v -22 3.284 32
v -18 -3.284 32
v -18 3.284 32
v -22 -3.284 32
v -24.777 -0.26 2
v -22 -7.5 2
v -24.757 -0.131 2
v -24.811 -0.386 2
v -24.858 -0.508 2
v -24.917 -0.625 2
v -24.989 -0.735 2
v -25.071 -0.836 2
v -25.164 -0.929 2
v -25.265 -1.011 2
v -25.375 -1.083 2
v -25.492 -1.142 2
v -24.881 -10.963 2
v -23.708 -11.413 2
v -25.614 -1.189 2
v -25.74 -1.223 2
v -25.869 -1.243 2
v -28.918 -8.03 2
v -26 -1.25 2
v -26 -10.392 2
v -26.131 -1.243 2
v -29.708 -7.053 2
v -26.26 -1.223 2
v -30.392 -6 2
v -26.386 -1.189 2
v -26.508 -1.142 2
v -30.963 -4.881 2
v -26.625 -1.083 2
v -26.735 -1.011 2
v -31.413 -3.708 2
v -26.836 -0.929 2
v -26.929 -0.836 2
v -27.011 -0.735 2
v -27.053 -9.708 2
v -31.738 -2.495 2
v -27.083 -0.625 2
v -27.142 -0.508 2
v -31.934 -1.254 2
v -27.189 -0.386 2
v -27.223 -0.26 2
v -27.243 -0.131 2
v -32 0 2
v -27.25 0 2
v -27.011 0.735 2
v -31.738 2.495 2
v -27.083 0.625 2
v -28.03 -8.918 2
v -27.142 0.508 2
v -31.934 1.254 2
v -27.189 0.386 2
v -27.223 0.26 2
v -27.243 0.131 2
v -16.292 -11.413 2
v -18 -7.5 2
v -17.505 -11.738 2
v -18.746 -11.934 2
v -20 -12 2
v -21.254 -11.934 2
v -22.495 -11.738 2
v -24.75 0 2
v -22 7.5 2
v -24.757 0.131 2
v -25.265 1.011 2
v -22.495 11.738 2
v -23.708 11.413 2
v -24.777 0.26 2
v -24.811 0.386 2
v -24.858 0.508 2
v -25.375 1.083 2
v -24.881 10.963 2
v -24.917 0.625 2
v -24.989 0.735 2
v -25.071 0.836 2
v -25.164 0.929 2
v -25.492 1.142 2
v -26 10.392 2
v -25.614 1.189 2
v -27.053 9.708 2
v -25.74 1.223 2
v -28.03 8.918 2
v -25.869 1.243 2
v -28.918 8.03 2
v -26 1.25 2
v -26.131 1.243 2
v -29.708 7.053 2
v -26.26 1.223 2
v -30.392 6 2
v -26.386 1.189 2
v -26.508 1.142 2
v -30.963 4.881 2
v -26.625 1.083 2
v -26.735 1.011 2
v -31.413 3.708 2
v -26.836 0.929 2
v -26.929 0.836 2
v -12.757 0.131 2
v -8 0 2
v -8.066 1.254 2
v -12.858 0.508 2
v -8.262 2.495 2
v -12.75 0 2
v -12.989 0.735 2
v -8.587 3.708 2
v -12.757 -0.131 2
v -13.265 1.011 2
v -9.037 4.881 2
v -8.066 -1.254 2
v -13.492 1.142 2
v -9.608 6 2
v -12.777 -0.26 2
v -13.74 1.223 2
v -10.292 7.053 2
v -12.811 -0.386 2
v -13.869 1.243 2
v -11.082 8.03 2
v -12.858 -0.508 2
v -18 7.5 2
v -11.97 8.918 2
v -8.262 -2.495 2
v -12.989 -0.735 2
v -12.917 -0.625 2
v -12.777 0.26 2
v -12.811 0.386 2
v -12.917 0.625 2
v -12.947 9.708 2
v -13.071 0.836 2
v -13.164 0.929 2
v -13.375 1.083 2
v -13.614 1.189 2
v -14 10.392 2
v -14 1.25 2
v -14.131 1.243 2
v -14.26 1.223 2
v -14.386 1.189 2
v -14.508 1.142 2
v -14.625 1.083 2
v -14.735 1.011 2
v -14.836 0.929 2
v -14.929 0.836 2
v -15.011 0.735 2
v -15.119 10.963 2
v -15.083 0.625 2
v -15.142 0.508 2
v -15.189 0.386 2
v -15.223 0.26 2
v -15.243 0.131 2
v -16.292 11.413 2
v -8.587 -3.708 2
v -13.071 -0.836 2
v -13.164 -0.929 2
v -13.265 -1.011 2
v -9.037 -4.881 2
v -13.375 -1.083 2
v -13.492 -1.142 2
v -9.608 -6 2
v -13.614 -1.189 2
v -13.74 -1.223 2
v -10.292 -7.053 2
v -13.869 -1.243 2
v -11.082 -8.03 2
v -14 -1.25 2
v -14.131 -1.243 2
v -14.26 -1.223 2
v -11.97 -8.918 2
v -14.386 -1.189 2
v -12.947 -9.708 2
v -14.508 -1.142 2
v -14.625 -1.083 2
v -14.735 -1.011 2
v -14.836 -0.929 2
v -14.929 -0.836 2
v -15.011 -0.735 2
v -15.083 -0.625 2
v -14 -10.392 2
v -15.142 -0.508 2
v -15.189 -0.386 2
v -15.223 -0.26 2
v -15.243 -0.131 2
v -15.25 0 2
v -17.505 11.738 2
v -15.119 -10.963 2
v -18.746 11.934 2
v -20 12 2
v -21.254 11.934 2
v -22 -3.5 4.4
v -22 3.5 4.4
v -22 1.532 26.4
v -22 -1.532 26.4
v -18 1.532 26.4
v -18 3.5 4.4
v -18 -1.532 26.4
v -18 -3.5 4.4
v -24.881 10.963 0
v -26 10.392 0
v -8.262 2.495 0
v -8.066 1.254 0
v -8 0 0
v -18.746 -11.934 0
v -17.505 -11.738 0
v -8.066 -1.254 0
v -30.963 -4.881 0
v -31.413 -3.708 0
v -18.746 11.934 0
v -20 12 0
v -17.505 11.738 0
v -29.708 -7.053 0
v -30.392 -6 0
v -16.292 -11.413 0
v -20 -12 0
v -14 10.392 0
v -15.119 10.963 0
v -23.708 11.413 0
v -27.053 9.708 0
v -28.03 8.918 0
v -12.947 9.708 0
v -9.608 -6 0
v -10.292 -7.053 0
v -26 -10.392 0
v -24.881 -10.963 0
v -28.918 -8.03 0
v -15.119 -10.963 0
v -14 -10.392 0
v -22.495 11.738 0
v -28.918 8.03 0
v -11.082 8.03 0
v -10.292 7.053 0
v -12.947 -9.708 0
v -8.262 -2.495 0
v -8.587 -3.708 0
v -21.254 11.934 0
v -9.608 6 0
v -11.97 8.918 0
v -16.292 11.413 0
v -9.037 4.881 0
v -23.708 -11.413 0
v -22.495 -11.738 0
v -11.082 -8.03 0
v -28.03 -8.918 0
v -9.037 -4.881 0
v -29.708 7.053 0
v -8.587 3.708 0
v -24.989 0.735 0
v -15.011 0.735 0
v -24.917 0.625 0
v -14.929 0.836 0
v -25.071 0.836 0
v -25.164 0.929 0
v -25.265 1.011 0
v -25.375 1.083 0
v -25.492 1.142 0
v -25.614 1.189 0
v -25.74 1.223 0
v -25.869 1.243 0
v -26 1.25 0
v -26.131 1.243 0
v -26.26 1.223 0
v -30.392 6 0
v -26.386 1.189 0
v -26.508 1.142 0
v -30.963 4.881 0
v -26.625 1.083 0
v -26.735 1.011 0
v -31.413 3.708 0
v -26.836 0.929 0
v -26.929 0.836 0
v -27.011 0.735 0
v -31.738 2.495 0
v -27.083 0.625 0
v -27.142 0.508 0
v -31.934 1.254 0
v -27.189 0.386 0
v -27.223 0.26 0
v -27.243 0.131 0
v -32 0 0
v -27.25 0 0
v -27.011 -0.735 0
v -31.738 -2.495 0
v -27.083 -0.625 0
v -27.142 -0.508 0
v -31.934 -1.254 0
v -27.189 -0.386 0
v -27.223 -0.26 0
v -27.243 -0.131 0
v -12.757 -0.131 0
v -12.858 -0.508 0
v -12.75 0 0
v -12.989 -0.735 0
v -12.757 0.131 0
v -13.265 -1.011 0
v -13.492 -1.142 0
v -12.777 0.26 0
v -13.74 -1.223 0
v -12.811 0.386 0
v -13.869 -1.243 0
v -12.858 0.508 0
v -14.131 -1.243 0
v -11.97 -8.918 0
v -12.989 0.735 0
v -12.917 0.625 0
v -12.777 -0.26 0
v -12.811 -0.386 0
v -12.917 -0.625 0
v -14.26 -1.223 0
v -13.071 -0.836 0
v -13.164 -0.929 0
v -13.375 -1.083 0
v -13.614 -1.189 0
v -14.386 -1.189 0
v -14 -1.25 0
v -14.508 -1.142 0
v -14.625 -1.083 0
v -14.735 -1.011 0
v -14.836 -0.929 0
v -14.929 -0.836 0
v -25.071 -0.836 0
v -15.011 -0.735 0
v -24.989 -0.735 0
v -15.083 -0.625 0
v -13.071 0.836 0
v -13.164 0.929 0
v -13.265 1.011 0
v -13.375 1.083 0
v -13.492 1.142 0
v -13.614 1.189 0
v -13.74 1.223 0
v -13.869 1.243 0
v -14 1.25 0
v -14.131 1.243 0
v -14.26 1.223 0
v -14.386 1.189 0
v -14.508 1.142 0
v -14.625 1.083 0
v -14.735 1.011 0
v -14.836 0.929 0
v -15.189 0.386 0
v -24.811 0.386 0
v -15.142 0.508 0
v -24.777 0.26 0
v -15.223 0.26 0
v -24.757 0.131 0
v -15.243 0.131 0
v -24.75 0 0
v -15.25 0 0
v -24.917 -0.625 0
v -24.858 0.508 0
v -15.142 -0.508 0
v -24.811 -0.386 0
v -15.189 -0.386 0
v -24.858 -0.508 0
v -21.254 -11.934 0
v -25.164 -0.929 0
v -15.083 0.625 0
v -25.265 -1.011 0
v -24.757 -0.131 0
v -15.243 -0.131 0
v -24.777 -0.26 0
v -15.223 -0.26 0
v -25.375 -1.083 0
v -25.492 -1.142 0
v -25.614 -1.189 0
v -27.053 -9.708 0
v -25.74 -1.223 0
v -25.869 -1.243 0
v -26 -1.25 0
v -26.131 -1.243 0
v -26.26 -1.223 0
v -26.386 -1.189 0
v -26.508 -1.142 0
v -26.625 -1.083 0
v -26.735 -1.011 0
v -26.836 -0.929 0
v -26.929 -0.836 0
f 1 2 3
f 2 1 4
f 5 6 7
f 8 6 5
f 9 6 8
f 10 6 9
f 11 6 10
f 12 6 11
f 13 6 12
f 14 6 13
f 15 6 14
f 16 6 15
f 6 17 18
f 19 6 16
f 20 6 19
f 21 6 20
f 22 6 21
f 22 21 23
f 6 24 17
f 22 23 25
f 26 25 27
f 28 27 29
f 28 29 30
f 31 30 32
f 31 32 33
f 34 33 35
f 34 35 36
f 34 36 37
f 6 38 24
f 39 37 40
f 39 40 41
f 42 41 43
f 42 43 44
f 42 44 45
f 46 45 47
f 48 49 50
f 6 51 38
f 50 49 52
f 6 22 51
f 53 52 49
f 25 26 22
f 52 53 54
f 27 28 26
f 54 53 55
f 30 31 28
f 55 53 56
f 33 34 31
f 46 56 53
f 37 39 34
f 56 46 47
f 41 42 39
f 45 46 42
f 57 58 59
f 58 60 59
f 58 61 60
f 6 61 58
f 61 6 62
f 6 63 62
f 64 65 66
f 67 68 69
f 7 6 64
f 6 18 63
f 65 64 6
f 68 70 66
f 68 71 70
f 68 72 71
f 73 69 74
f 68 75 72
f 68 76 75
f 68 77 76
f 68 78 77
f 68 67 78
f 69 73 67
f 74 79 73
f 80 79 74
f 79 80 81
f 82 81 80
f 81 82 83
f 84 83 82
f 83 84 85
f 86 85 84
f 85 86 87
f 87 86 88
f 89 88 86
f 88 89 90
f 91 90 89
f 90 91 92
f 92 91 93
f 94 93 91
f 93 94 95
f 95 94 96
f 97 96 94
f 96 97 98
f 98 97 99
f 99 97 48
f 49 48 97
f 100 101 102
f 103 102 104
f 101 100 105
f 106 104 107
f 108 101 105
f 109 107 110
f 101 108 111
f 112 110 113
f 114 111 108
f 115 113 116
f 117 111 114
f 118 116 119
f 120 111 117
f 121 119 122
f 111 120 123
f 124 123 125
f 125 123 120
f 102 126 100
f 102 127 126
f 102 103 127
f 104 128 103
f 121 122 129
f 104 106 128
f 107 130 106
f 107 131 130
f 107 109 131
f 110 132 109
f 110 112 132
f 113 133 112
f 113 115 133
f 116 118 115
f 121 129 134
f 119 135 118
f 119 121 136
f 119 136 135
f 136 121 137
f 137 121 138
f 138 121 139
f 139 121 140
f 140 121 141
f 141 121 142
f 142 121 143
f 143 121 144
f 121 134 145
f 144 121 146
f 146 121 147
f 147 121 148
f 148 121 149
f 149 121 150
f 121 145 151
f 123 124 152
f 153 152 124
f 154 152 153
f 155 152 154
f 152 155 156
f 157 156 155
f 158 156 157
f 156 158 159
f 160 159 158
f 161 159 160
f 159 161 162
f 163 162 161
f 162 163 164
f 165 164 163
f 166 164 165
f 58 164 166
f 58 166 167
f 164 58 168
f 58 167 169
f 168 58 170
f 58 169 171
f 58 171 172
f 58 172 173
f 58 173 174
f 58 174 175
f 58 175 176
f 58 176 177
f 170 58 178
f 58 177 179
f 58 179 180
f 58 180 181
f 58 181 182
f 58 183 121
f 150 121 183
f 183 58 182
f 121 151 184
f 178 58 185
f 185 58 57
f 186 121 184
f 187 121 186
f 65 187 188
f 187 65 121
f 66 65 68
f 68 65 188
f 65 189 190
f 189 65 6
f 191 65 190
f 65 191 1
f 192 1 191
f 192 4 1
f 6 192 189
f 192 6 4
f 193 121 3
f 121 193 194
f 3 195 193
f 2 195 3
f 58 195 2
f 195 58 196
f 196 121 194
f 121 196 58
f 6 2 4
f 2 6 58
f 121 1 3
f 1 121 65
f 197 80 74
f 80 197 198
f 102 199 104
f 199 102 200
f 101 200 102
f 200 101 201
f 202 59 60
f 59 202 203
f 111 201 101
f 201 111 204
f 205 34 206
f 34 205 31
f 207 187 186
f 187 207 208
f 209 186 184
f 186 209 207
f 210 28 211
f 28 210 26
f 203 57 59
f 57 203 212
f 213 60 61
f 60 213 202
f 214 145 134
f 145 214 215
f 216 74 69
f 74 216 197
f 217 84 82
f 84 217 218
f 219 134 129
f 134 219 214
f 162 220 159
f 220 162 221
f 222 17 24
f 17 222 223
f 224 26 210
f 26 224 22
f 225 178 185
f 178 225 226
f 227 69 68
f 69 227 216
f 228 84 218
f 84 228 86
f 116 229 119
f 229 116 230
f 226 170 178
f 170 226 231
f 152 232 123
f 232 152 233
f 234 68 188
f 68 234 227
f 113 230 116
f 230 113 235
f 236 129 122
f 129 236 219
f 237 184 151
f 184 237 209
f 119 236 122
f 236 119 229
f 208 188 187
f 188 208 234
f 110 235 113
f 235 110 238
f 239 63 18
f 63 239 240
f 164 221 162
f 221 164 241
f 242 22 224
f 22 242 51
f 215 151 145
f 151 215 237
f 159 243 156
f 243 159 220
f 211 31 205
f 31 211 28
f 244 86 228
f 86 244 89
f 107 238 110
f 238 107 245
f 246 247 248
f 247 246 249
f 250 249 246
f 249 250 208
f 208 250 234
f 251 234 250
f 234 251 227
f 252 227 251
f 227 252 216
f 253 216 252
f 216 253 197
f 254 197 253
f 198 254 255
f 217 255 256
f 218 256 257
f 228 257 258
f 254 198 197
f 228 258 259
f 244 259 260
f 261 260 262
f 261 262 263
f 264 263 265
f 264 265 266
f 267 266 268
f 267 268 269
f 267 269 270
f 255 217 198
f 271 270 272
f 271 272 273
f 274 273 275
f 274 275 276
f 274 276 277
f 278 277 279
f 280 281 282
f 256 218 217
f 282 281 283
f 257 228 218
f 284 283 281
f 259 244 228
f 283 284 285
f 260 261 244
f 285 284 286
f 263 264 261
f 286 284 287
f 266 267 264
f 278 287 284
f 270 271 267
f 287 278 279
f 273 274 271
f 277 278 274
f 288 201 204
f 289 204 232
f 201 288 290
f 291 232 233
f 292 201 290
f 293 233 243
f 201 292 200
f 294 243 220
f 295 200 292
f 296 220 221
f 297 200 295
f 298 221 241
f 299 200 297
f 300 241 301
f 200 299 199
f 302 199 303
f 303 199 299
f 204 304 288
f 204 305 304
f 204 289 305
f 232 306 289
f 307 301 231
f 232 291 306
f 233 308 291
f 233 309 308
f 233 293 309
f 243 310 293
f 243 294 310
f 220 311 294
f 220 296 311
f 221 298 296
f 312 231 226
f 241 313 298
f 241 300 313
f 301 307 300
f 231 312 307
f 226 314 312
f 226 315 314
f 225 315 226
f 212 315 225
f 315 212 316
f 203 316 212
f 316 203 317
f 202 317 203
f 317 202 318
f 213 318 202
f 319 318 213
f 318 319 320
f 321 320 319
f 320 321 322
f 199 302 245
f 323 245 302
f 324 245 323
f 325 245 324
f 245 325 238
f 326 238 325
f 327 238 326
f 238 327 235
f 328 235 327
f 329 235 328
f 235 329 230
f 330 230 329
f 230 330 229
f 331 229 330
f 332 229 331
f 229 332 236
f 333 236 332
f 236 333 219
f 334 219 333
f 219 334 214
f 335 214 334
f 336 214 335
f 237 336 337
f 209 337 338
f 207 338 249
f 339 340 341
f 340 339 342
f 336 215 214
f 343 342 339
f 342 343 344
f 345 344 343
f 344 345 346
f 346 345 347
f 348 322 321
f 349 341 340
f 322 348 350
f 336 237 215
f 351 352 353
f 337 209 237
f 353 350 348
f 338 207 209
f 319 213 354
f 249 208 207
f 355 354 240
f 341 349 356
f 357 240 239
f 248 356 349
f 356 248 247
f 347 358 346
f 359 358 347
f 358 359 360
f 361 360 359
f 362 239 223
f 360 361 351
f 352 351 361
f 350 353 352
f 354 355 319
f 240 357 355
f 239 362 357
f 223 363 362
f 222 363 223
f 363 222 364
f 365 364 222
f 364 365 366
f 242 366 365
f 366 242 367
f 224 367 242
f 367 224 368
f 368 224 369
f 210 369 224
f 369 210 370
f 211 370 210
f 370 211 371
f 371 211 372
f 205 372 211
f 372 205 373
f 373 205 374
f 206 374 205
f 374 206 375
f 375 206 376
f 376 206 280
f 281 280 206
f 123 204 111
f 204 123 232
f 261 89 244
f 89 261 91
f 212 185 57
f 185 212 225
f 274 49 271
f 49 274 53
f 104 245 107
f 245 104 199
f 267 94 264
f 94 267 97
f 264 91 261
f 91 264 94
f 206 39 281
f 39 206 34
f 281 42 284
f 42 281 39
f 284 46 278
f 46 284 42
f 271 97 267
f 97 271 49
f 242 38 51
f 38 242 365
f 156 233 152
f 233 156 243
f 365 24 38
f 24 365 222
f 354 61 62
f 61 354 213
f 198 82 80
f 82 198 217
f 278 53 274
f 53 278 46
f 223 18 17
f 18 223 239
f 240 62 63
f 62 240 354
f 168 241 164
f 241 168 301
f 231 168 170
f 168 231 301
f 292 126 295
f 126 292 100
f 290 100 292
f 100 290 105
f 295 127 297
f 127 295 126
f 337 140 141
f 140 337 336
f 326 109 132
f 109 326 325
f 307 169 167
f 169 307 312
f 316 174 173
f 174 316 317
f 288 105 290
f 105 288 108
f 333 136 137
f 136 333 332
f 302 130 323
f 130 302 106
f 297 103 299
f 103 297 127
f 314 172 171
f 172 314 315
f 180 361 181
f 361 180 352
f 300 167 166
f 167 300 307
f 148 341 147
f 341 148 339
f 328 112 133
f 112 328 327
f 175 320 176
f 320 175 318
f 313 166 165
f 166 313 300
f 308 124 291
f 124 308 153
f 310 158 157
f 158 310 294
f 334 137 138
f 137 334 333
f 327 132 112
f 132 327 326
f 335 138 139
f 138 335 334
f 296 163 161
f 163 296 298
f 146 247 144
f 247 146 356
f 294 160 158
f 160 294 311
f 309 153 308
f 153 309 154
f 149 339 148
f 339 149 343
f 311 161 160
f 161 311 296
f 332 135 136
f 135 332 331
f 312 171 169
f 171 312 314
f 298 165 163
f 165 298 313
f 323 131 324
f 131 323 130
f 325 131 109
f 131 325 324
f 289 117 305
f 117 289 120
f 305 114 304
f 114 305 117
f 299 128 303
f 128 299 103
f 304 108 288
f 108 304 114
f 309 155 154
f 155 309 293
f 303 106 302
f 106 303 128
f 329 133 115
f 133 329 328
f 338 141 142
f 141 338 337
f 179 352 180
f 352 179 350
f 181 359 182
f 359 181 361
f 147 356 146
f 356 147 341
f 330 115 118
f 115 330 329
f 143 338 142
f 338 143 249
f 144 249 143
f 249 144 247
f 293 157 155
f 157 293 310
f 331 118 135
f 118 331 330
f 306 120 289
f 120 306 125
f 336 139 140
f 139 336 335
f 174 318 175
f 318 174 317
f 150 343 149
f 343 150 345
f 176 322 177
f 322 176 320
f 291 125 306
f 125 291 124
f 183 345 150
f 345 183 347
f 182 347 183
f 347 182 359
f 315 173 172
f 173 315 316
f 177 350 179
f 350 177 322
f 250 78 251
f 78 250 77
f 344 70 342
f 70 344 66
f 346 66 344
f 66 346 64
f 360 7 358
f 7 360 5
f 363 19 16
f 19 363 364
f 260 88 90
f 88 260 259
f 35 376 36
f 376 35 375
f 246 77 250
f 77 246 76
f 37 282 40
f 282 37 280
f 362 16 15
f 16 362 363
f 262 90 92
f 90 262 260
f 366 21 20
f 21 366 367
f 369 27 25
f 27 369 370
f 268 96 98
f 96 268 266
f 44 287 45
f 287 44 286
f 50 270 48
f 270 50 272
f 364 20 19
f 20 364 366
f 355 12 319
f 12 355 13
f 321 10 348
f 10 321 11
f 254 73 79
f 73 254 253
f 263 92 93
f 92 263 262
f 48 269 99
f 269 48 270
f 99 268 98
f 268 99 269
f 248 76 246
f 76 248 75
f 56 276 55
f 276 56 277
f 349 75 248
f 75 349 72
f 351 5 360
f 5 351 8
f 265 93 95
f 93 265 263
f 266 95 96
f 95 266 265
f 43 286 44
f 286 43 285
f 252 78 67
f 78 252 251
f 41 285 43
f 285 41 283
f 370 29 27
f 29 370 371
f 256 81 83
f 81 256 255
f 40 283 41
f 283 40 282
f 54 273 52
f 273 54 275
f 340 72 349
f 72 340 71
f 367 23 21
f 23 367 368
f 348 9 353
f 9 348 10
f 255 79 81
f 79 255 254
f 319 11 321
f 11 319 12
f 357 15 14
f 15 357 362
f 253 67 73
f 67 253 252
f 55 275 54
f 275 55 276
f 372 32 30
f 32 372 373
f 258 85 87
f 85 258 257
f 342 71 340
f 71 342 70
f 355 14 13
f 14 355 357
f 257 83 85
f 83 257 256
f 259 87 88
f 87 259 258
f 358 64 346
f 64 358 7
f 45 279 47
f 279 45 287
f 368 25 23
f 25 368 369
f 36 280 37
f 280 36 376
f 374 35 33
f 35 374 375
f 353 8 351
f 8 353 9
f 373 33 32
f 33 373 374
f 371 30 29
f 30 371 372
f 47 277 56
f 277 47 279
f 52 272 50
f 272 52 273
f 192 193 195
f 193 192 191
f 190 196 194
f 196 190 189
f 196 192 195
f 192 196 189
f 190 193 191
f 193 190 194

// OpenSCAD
// file: variables.scad
// Set number of facets for arcs
$fn=60;

// General constants
TRUE = 1;
FALSE = 0;

// General design
wallT = 2;
clearance = 0.2;

// MotorSupports
motorOD = 24;
motorScrewOD = 2.1;
motorScrewAlignementD1 = 12;
motorScrewAlignementD2 = 16;
motorAxleOD = 6.2;
armInsideSupport = 15;
feetW = 15;
feetH = 30;
feetT = wallT*2;

// Rear holder bearing
armBearingID = 9.8;
armBearingOD = 15;
armBearingBore = 4;
armBearingFlange = 0.4;

// Arm
armOD = 10;
armID = 8.9;
armInsideSupport = 15;
armHolderH = 32.5;
armHolderFrontW = 30;
armHolderFrontD = armInsideSupport+2*wallT;
armHolderRearD = armBearingBore+2*wallT;
armHolderRearW = 40;
armBearingsSeparatorLength = 20;
armYawSteelWireOD = 0.9;
armFrontAngle = -3;
armFrontAngleFolded = 103;
armServoH = 21.7;
armServoD = 12.2;
armServoW = 23.1;
armServoRotorH = 29-armServoH;
armServoEarH = 16.5;
armServoEarT = 5;
armServoEarW = 32;
armServoArmD = 12; // from center of the servo mount
armMotorCircleD = 285;


// Screw
armScrewOD = 3;
armScrewLength = 8;
armScrewNutW = 5.5;
armScrewNutH = 2.6;
armScrewHeadOD = 5.8;
armScrewHeadH = 2.6;

// basePlates
basePlateW = 50;
basePlateD = 160;
basePlateT = wallT*1.5;
basePlateArmHolderFrontPivotD = basePlateD-armHolderFrontW/2;

// Zip tie - Include clearance
zipTieW = 5;
zipTieD = 3;

// Prop
propW = 5*25.4;
propOD = 127;

// Vibration Damping balls
vibDampingH = 12.7;
vibDampingODL = 8;
vibDampingODS = 6;
vibDampingMainbodyH = 8;

// Camera
cameraSize = 32;
cameraH = 26.4;
cameraPCBH = 1.6;
cameraSupportSize = 3.5;
cameraSupportD = cameraPCBH+wallT*2+clearance*2;

// ESC
ESCH = 6;

// Lipo
lipoW = 107;
lipoD = 34;
lipoH = 24;

// CC3D
CC3DBox = 39.3;

// Arm length
CC3DCenterX = basePlateW/2-basePlateW/8+armBearingsSeparatorLength+2*wallT+armHolderRearD+wallT*2+CC3DBox/2;
CC3DCenterY = basePlateW/2;
CC3DCenterToPivotModule = sqrt( (basePlateArmHolderFrontPivotD-CC3DCenterX)*(basePlateArmHolderFrontPivotD-CC3DCenterX)+(basePlateW/2)*(basePlateW/2));
angleCC3DCenterPivotMotor = acos( (basePlateArmHolderFrontPivotD-CC3DCenterX)/CC3DCenterToPivotModule )+armFrontAngle+90;
pivotToMotorLength = sqrt(armMotorCircleD/2*armMotorCircleD/2-CC3DCenterToPivotModule*CC3DCenterToPivotModule*sin(angleCC3DCenterPivotMotor)*sin(angleCC3DCenterPivotMotor))+CC3DCenterToPivotModule*cos(angleCC3DCenterPivotMotor);
armLengthFront = pivotToMotorLength+armInsideSupport-armHolderFrontD/2-motorOD/2-clearance;
armLengthRear = armMotorCircleD/2-40/2-2*wallT-motorOD/2-clearance;
// file: Elements.scad
$fn=60;

include <variables.scad>

motorDiameter = 23.6;

module hollowCylinder( OD, ID, length ) {
  difference() {
    cylinder( r=OD/2, h=length );
    translate( [0, 0, -1] ) cylinder( r=ID/2, h=length+2 );
  }
}

// From http://svn.clifford.at/openscad/trunk/libraries/shapes.scad
module roundedBox(size, radius) {
	translate( size/2 ) union() {
    cube(size - [2*radius,0,0], true);
    cube(size - [0,2*radius,0], true);
    for (x = [radius-size[0]/2, -radius+size[0]/2],
          y = [radius-size[1]/2, -radius+size[1]/2]) {
      translate([x,y,0]) cylinder(r=radius, h=size[2], center=true);
    }
  }
}


module CC3DBox() {
  cube( [40, 40, 20] );
}

module motorZmr1804() {
	
	difference() {
		color ( [0.25,0.25,0.25, 1] ) union() {
			cylinder( r1= 17/2, r2=motorDiameter/2, h=3);
			translate( [0,0,3] ) cylinder( r=motorDiameter/2, h=9.1);
			translate( [0,0,-1] ) cylinder( r=2/2, h=1);
			translate( [0,0,12.1] ) cylinder( r=7/2, h=1);
			translate( [0,0,13.1] ) cylinder( r=5/2, h=5.9 );
			translate( [0,0,19] ) cylinder( r1=11/2, r2=3/2, h=9 );
		};
		for( i = [45, 135, 225, 315] ) {
			rotate( [0,0,i] )
			translate([12.4/2, 0, 0])
			cylinder( r=2/2, h=4, center=true );
		};
	};
}

module motorDYS_BE1806() {
  // http://new.banggood.com/fr/DYS-BE1806-2300KV-Brushless-Motor-Black-Edition-for-Multicopters-p-946416.html?currency=EUR
	motorOD_DYS = 23;
  difference() {
		color ( [0.25, 0.25, 0.25, 1] ) union() {
			translate( [0, 0, 0] ) cylinder( r=motorOD_DYS/2, h=18.5-2);
			translate( [0, 0, 18.5-2] ) cylinder( r1=motorOD_DYS/2, r2=15/2, h=2);
			translate( [0,0,18.5] ) cylinder( r=7/2, h=1);
			translate( [0,0,18.5+1] ) cylinder( r=2/2, h=5.9 );
			translate( [0,0,15.5+1+5.9] ) cylinder( r1=11/2, r2=3/2, h=9 );
		};
		for( i = [0, 180] ) {
			rotate( [0, 0, i] )
			translate( [12/2, 0, 0] )
			cylinder( r=2/2, h=4, center=true );
		};
    for( i = [90, 270] ) {
			rotate( [0, 0, i] )
			translate( [16/2, 0, 0] )
			cylinder( r=2/2, h=4, center=true );
		};
	};
}


module propeller() {
	union() {
		color( "orange" ) difference() {
			union() {
				cylinder( r=8/2, h=4 );
				for( i = [0, 120, 240] ) {
					rotate( [30,0,i] )
					cube( [120,4,1] );
				};
			};
			cylinder( r=5/2, h=20, center=true);
			difference() {
				cylinder( r=propOD, h=20, center=true);
				cylinder( r=propOD/2, h=22, center=true);
			}
		
		};
		color( "orange", 0.1) cylinder(r=propOD/2, h=3 );
	};
}

module lipo() {
	color( "darkgreen" ) union() {
    cube( [lipoW, lipoD, lipoH] );
    translate( [-7, 0, 0] ) cube( [7, 10, 5] );
  }
}

module receiverFrSkyD4RII() {
  color( "maroon" ) cube( [40, 25, 6] );
}


module CC3D() {
	difference() {
		cube( [36,36,5] );
		translate( [2.75,2.75,0] ) cylinder( r=3/2, h=20, center=true);
		translate( [30.5+2.75,2.75,0] ) cylinder( r=3/2, h=20, center=true);
		translate( [30.5+2.75,30.5+2.75,0] ) cylinder( r=3/2, h=20, center=true);
		translate( [2.75,30.5+2.75,0] ) cylinder( r=3/2, h=20, center=true);
	};
}

module ESCAfro12A() {
  color("darkgreen") rotate( [0, 0, 90] )
    translate( [0, -20, 0] )cube( [25, 20, 6] );
}

module servo( size ) {
  union() {
    cube( size );
    translate( [armServoW/2-armServoEarW/2, 0, armServoEarH] ) cube( [armServoEarW, armServoD, armServoEarT] );
    translate( [armServoD/2, armServoD/2, armServoH] ) cylinder( r=armServoD/4, h=armServoRotorH );
  }
}

module sony600TVL() {
  PCBSize = 32;
  PCBHeight = 1.6;
  BaseSize = 17;
  BaseH = 8.1;
  BaseOD = 4.9;
  BaseEar = 3.5;
  CylinderOD1 = 15.4;
  CylinderH1 = 8.25;
  CylinderOD2 = 11.8;
  CylinderH2 = 4.9;
  CylinderOD3 = 14;
  CylinderH3 = 3.5;
  CapacitorOD = 3.9;
  CapacitorH = 10;
  mountingHolesOD = 2.1;
  mountingHolesShift = 14;
  
  union() {
    // PCB
    difference() {
      translate( [0, 0, PCBHeight/2] ) color( "DarkSlateGrey" )
        cube( [PCBSize, PCBSize, PCBHeight], center = true );
      translate( [ mountingHolesShift, mountingHolesShift, 0] )
        cylinder( r=mountingHolesOD/2, h=PCBHeight+2, center = true );
      translate( [ mountingHolesShift, -mountingHolesShift, 0] )
        cylinder( r=mountingHolesOD/2, h=PCBHeight+2, center = true );
      translate( [ -mountingHolesShift, mountingHolesShift, 0] )
        cylinder( r=mountingHolesOD/2, h=PCBHeight+2, center = true );
      translate( [ -mountingHolesShift, -mountingHolesShift, 0] )
        cylinder( r=mountingHolesOD/2, h=PCBHeight+2, center = true );
    }
    color( "DimGrey" ) {
      // Base
      translate( [0, 0, PCBHeight+BaseH/2] )      // Cube
        cube( [BaseSize, BaseSize, BaseH], center = true );
      translate( [0, 0, PCBHeight+BaseH/2] )      // Ear
        cube( [BaseSize+(BaseEar-BaseOD/2)*2, BaseOD, BaseH], center = true );
      translate( [(BaseSize+BaseOD-BaseEar)/2, 0, PCBHeight+BaseH/2] )    // Ear Cylinder
        cylinder( r=BaseOD/2, h=BaseH, center = true );
      translate( [-(BaseSize+BaseOD-BaseEar)/2, 0, PCBHeight+BaseH/2] )    // Ear Cylinder
        cylinder( r=BaseOD/2, h=BaseH, center = true );
      // Stage 1
      translate( [0, 0, PCBHeight+BaseH+CylinderH1/2] )
        cylinder( r=CylinderOD1/2, h=CylinderH1, center = true );
      // Stage 2
      translate( [0, 0, PCBHeight+BaseH+CylinderH1+CylinderH2/2] )
        cylinder( r=CylinderOD2/2, h=CylinderH2, center = true );
      // Stage 3
      translate( [0, 0, PCBHeight+BaseH+CylinderH1+CylinderH2+CylinderH3/2] )
        cylinder( r=CylinderOD3/2, h=CylinderH3, center = true );
    }
    // Capacitor
    translate( [ 11.5, -4.8, PCBHeight+1+CapacitorH/2] ) color ( "GhostWhite" )
      cylinder( r=CapacitorOD/2, h=CapacitorH, center = true );
  }
}


// motorZmr1804();
// propeller();
// lipo2200_25C();
// CC3D();
// sony600TVL();
// file: Variables.scad
// Set number of facets for arcs
$fn=60;

// General constants
TRUE = 1;
FALSE = 0;

// General design
wallT = 2;
clearance = 0.2;

// MotorSupports
motorOD = 24;
motorScrewOD = 2.1;
motorScrewAlignementD1 = 12;
motorScrewAlignementD2 = 16;
motorAxleOD = 6.2;
armInsideSupport = 15;
feetW = 15;
feetH = 30;
feetT = wallT*2;

// Rear holder bearing
armBearingID = 9.8;
armBearingOD = 15;
armBearingBore = 4;
armBearingFlange = 0.4;

// Arm
armOD = 10;
armID = 8.9;
armInsideSupport = 15;
armHolderH = 32.5;
armHolderFrontW = 30;
armHolderFrontD = armInsideSupport+2*wallT;
armHolderRearD = armBearingBore+2*wallT;
armHolderRearW = 40;
armBearingsSeparatorLength = 20;
armYawSteelWireOD = 0.9;
armFrontAngle = -3;
armFrontAngleFolded = 103;
armServoH = 21.7;
armServoD = 12.2;
armServoW = 23.1;
armServoRotorH = 29-armServoH;
armServoEarH = 16.5;
armServoEarT = 5;
armServoEarW = 32;
armServoArmD = 12; // from center of the servo mount
armMotorCircleD = 285;


// Screw
armScrewOD = 3;
armScrewLength = 8;
armScrewNutW = 5.5;
armScrewNutH = 2.6;
armScrewHeadOD = 5.8;
armScrewHeadH = 2.6;

// basePlates
basePlateW = 50;
basePlateD = 160;
basePlateT = wallT*1.5;
basePlateArmHolderFrontPivotD = basePlateD-armHolderFrontW/2;

// Zip tie - Include clearance
zipTieW = 5;
zipTieD = 3;

// Prop
propW = 5*25.4;
propOD = 127;

// Vibration Damping balls
vibDampingH = 12.7;
vibDampingODL = 8;
vibDampingODS = 6;
vibDampingMainbodyH = 8;

// Camera
cameraSize = 32;
cameraH = 26.4;
cameraPCBH = 1.6;
cameraSupportSize = 3.5;
cameraSupportD = cameraPCBH+wallT*2+clearance*2;

// ESC
ESCH = 6;

// Lipo
lipoW = 107;
lipoD = 34;
lipoH = 24;

// CC3D
CC3DBox = 39.3;

// Arm length
CC3DCenterX = basePlateW/2-basePlateW/8+armBearingsSeparatorLength+2*wallT+armHolderRearD+wallT*2+CC3DBox/2;
CC3DCenterY = basePlateW/2;
CC3DCenterToPivotModule = sqrt( (basePlateArmHolderFrontPivotD-CC3DCenterX)*(basePlateArmHolderFrontPivotD-CC3DCenterX)+(basePlateW/2)*(basePlateW/2));
angleCC3DCenterPivotMotor = acos( (basePlateArmHolderFrontPivotD-CC3DCenterX)/CC3DCenterToPivotModule )+armFrontAngle+90;
pivotToMotorLength = sqrt(armMotorCircleD/2*armMotorCircleD/2-CC3DCenterToPivotModule*CC3DCenterToPivotModule*sin(angleCC3DCenterPivotMotor)*sin(angleCC3DCenterPivotMotor))+CC3DCenterToPivotModule*cos(angleCC3DCenterPivotMotor);
armLengthFront = pivotToMotorLength+armInsideSupport-armHolderFrontD/2-motorOD/2-clearance;
armLengthRear = armMotorCircleD/2-40/2-2*wallT-motorOD/2-clearance;
// main file
// Include needed libraries
include <Variables.scad>;
use <Elements.scad>;

// Set number of facets for arcs
$fn=60;


// Defines if we want a 'printable file' or a view with elements (motors...)
RENDER = 0;
PRINT = 1;
ASSEMBLY = 2;
view = PRINT;


// General design
wallT = 2;
clearance = 0.2;

// Arm
armOD = 10;

// MotorSupports
/*motorOD = 23;
motorScrewOD = 2.1;
motorScrewAlignementD1 = 12;
motorScrewAlignementD2 = 16;
motorAxleOD = 6.2;
armInsideSupport = 20;
feetW = 15;
feetH = 30;
feetT = wallT*2;*/


module motorSupport() {
  supportH = armOD+wallT*2+clearance*2;
  motorCenter = motorOD/2+wallT+clearance+armInsideSupport;
  
  difference() {
    union() {
      // Add - Arm extension
      hull() {
        cylinder( r=supportH/2, h=armInsideSupport+(motorOD+wallT)/2 );
        translate( [-supportH/2, -supportH/4/2, 0] )    // Flat surface to improve printing
          cube( [wallT, supportH/4, armInsideSupport+(motorOD+wallT)/2] );
      }
      // Add - Motor support
      translate( [-supportH/2, 0, motorCenter] )
        rotate( [0, 90, 0] ) cylinder( r=motorOD/2+clearance*2+wallT, h=supportH );
    }
    // Remove - arm - X=0.01 is to avoid removing on same planen
    translate( [0.01, 0, -1] ) cylinder( r=armOD/2+clearance/2, h = armInsideSupport+motorOD/2+1 );
    // Remove - Motor hole
    translate( [-supportH/2+wallT, 0, motorCenter] )
      rotate( [0, 90, 0] ) cylinder( r=motorOD/2+clearance*2, h=supportH );
    // Remove - Motor screws
    translate( [-supportH/2+1, 0, motorCenter] ) rotate( [45, 0, 0] ) rotate( [0, 90, 0] ) {
      for( i = [90, 270] ) {
        rotate( [0, 0, i] ) translate( [motorScrewAlignementD1/2, 0, 0] )
        cylinder( r=motorScrewOD/2+clearance, h=wallT+2, center=true );
      }
      for( i = [0, 180] ) {
        rotate( [0, 0, i] ) translate( [motorScrewAlignementD2/2, 0, 0] )
        cylinder( r=motorScrewOD/2+clearance, h=wallT+2, center=true );
      }
    }
    // Remove - Wire insertion
    translate( [-armOD/2, -wallT/2, -1] )
      cube( [armOD+wallT+2, wallT, armInsideSupport*2] );
    // Remove - Motor axle
    translate( [-supportH+1, 0, motorCenter] ) rotate( [0, 90, 0] )
      cylinder( r=motorAxleOD/2+clearance, h=supportH+2 );
  }
}

module feet() {
  angle = 8;
  holeOD = 3;

  difference() {
    cube( [feetW, feetT, feetH] );
    translate( [-feetW*2, -1, 0] ) rotate( [0, angle, 0] )
      cube( [feetW*2*cos(angle), feetT*2, feetH*2] );
    translate( [feetW, -1, 0] ) rotate( [0, -angle, 0] )
      cube( [feetW*2*cos(angle), feetT*2, feetH*2] );
  }
}


module motorScrews() {
  motorScrewAlignementD = motorScrewAlignementD1;
  union() {
    translate( [motorScrewAlignementD/2, 0, -1 ] )
      cylinder( r=motorScrewOD/2+clearance, h=wallT+2 );
    translate( [-motorScrewAlignementD/2, 0, -1 ] )
      cylinder( r=motorScrewOD/2+clearance, h=wallT+2 );
  }
}

module motorSupportFeet() {
  difference() {
    union() {
      // Add - Support plate
      cylinder( r=motorOD/2, h=wallT );
      translate( [feetT/2, -feetW/2, wallT] ) 
        rotate( [ 0, 0, 90] ) feet( wallT=wallT, feetT=feetT, feetH=feetH );
    }
    // Remove - Motor screws
    motorScrews();
    // Remove - Feet decoration
    resize( [feetT+2, feetW-feetT*2, feetH-feetT*2] )
      translate( [feetT/2, -feetW/2, wallT+feetT] ) rotate( [ 0, 0, 90] ) feet( feetT=feetT );
  }
}

module feetPropSaver() {
  difference() {
    union() {
      // Add - Motor feet
      motorSupportFeet();
      // Add - Structure
      for( i = [0 : 360/8 : 360] ) {
        translate( [0, 0, wallT/2] ) rotate( [90, 0, i] )
          cylinder( h=propOD/2.5, r=wallT/2 );
      // Add - Structure's circle
     translate( [0, 0, wallT/2] ) rotate_extrude( convexity = 10, $fn = 60 )
       translate([propOD/2.5, 0, 0])
         circle( r=wallT/2 );
      }
    }
    // Remove - motor screws
    motorScrews();
  }
}


if ( view == PRINT ) {
  translate( [0, 0, (armOD+wallT*2+clearance*2)/2] )
    rotate( [ 0, 270, 180] ) motorSupport();
  !translate( [-20, 0, 0] ) motorSupportFeet();
  translate( [0, propOD/1.5, 0] ) feetPropSaver();
} 
if ( ( view == RENDER) || ( view == ASSEMBLY) ) {
  translate( [0, 0, 0] ) rotate( [ 0, 270, 180] ) motorSupport();
  translate( [motorOD/2+wallT+armInsideSupport, 0, -(armOD+wallT*2+clearance*2)/2+wallT] )
    rotate( [ 0, 0, 90] ) motorDYS_BE1806();
  translate( [motorOD/2+wallT+armInsideSupport, 0, -(armOD+wallT*2+clearance*2)/2] )
    rotate( [ 180, 0, 90] ) motorSupportFeet();
}
